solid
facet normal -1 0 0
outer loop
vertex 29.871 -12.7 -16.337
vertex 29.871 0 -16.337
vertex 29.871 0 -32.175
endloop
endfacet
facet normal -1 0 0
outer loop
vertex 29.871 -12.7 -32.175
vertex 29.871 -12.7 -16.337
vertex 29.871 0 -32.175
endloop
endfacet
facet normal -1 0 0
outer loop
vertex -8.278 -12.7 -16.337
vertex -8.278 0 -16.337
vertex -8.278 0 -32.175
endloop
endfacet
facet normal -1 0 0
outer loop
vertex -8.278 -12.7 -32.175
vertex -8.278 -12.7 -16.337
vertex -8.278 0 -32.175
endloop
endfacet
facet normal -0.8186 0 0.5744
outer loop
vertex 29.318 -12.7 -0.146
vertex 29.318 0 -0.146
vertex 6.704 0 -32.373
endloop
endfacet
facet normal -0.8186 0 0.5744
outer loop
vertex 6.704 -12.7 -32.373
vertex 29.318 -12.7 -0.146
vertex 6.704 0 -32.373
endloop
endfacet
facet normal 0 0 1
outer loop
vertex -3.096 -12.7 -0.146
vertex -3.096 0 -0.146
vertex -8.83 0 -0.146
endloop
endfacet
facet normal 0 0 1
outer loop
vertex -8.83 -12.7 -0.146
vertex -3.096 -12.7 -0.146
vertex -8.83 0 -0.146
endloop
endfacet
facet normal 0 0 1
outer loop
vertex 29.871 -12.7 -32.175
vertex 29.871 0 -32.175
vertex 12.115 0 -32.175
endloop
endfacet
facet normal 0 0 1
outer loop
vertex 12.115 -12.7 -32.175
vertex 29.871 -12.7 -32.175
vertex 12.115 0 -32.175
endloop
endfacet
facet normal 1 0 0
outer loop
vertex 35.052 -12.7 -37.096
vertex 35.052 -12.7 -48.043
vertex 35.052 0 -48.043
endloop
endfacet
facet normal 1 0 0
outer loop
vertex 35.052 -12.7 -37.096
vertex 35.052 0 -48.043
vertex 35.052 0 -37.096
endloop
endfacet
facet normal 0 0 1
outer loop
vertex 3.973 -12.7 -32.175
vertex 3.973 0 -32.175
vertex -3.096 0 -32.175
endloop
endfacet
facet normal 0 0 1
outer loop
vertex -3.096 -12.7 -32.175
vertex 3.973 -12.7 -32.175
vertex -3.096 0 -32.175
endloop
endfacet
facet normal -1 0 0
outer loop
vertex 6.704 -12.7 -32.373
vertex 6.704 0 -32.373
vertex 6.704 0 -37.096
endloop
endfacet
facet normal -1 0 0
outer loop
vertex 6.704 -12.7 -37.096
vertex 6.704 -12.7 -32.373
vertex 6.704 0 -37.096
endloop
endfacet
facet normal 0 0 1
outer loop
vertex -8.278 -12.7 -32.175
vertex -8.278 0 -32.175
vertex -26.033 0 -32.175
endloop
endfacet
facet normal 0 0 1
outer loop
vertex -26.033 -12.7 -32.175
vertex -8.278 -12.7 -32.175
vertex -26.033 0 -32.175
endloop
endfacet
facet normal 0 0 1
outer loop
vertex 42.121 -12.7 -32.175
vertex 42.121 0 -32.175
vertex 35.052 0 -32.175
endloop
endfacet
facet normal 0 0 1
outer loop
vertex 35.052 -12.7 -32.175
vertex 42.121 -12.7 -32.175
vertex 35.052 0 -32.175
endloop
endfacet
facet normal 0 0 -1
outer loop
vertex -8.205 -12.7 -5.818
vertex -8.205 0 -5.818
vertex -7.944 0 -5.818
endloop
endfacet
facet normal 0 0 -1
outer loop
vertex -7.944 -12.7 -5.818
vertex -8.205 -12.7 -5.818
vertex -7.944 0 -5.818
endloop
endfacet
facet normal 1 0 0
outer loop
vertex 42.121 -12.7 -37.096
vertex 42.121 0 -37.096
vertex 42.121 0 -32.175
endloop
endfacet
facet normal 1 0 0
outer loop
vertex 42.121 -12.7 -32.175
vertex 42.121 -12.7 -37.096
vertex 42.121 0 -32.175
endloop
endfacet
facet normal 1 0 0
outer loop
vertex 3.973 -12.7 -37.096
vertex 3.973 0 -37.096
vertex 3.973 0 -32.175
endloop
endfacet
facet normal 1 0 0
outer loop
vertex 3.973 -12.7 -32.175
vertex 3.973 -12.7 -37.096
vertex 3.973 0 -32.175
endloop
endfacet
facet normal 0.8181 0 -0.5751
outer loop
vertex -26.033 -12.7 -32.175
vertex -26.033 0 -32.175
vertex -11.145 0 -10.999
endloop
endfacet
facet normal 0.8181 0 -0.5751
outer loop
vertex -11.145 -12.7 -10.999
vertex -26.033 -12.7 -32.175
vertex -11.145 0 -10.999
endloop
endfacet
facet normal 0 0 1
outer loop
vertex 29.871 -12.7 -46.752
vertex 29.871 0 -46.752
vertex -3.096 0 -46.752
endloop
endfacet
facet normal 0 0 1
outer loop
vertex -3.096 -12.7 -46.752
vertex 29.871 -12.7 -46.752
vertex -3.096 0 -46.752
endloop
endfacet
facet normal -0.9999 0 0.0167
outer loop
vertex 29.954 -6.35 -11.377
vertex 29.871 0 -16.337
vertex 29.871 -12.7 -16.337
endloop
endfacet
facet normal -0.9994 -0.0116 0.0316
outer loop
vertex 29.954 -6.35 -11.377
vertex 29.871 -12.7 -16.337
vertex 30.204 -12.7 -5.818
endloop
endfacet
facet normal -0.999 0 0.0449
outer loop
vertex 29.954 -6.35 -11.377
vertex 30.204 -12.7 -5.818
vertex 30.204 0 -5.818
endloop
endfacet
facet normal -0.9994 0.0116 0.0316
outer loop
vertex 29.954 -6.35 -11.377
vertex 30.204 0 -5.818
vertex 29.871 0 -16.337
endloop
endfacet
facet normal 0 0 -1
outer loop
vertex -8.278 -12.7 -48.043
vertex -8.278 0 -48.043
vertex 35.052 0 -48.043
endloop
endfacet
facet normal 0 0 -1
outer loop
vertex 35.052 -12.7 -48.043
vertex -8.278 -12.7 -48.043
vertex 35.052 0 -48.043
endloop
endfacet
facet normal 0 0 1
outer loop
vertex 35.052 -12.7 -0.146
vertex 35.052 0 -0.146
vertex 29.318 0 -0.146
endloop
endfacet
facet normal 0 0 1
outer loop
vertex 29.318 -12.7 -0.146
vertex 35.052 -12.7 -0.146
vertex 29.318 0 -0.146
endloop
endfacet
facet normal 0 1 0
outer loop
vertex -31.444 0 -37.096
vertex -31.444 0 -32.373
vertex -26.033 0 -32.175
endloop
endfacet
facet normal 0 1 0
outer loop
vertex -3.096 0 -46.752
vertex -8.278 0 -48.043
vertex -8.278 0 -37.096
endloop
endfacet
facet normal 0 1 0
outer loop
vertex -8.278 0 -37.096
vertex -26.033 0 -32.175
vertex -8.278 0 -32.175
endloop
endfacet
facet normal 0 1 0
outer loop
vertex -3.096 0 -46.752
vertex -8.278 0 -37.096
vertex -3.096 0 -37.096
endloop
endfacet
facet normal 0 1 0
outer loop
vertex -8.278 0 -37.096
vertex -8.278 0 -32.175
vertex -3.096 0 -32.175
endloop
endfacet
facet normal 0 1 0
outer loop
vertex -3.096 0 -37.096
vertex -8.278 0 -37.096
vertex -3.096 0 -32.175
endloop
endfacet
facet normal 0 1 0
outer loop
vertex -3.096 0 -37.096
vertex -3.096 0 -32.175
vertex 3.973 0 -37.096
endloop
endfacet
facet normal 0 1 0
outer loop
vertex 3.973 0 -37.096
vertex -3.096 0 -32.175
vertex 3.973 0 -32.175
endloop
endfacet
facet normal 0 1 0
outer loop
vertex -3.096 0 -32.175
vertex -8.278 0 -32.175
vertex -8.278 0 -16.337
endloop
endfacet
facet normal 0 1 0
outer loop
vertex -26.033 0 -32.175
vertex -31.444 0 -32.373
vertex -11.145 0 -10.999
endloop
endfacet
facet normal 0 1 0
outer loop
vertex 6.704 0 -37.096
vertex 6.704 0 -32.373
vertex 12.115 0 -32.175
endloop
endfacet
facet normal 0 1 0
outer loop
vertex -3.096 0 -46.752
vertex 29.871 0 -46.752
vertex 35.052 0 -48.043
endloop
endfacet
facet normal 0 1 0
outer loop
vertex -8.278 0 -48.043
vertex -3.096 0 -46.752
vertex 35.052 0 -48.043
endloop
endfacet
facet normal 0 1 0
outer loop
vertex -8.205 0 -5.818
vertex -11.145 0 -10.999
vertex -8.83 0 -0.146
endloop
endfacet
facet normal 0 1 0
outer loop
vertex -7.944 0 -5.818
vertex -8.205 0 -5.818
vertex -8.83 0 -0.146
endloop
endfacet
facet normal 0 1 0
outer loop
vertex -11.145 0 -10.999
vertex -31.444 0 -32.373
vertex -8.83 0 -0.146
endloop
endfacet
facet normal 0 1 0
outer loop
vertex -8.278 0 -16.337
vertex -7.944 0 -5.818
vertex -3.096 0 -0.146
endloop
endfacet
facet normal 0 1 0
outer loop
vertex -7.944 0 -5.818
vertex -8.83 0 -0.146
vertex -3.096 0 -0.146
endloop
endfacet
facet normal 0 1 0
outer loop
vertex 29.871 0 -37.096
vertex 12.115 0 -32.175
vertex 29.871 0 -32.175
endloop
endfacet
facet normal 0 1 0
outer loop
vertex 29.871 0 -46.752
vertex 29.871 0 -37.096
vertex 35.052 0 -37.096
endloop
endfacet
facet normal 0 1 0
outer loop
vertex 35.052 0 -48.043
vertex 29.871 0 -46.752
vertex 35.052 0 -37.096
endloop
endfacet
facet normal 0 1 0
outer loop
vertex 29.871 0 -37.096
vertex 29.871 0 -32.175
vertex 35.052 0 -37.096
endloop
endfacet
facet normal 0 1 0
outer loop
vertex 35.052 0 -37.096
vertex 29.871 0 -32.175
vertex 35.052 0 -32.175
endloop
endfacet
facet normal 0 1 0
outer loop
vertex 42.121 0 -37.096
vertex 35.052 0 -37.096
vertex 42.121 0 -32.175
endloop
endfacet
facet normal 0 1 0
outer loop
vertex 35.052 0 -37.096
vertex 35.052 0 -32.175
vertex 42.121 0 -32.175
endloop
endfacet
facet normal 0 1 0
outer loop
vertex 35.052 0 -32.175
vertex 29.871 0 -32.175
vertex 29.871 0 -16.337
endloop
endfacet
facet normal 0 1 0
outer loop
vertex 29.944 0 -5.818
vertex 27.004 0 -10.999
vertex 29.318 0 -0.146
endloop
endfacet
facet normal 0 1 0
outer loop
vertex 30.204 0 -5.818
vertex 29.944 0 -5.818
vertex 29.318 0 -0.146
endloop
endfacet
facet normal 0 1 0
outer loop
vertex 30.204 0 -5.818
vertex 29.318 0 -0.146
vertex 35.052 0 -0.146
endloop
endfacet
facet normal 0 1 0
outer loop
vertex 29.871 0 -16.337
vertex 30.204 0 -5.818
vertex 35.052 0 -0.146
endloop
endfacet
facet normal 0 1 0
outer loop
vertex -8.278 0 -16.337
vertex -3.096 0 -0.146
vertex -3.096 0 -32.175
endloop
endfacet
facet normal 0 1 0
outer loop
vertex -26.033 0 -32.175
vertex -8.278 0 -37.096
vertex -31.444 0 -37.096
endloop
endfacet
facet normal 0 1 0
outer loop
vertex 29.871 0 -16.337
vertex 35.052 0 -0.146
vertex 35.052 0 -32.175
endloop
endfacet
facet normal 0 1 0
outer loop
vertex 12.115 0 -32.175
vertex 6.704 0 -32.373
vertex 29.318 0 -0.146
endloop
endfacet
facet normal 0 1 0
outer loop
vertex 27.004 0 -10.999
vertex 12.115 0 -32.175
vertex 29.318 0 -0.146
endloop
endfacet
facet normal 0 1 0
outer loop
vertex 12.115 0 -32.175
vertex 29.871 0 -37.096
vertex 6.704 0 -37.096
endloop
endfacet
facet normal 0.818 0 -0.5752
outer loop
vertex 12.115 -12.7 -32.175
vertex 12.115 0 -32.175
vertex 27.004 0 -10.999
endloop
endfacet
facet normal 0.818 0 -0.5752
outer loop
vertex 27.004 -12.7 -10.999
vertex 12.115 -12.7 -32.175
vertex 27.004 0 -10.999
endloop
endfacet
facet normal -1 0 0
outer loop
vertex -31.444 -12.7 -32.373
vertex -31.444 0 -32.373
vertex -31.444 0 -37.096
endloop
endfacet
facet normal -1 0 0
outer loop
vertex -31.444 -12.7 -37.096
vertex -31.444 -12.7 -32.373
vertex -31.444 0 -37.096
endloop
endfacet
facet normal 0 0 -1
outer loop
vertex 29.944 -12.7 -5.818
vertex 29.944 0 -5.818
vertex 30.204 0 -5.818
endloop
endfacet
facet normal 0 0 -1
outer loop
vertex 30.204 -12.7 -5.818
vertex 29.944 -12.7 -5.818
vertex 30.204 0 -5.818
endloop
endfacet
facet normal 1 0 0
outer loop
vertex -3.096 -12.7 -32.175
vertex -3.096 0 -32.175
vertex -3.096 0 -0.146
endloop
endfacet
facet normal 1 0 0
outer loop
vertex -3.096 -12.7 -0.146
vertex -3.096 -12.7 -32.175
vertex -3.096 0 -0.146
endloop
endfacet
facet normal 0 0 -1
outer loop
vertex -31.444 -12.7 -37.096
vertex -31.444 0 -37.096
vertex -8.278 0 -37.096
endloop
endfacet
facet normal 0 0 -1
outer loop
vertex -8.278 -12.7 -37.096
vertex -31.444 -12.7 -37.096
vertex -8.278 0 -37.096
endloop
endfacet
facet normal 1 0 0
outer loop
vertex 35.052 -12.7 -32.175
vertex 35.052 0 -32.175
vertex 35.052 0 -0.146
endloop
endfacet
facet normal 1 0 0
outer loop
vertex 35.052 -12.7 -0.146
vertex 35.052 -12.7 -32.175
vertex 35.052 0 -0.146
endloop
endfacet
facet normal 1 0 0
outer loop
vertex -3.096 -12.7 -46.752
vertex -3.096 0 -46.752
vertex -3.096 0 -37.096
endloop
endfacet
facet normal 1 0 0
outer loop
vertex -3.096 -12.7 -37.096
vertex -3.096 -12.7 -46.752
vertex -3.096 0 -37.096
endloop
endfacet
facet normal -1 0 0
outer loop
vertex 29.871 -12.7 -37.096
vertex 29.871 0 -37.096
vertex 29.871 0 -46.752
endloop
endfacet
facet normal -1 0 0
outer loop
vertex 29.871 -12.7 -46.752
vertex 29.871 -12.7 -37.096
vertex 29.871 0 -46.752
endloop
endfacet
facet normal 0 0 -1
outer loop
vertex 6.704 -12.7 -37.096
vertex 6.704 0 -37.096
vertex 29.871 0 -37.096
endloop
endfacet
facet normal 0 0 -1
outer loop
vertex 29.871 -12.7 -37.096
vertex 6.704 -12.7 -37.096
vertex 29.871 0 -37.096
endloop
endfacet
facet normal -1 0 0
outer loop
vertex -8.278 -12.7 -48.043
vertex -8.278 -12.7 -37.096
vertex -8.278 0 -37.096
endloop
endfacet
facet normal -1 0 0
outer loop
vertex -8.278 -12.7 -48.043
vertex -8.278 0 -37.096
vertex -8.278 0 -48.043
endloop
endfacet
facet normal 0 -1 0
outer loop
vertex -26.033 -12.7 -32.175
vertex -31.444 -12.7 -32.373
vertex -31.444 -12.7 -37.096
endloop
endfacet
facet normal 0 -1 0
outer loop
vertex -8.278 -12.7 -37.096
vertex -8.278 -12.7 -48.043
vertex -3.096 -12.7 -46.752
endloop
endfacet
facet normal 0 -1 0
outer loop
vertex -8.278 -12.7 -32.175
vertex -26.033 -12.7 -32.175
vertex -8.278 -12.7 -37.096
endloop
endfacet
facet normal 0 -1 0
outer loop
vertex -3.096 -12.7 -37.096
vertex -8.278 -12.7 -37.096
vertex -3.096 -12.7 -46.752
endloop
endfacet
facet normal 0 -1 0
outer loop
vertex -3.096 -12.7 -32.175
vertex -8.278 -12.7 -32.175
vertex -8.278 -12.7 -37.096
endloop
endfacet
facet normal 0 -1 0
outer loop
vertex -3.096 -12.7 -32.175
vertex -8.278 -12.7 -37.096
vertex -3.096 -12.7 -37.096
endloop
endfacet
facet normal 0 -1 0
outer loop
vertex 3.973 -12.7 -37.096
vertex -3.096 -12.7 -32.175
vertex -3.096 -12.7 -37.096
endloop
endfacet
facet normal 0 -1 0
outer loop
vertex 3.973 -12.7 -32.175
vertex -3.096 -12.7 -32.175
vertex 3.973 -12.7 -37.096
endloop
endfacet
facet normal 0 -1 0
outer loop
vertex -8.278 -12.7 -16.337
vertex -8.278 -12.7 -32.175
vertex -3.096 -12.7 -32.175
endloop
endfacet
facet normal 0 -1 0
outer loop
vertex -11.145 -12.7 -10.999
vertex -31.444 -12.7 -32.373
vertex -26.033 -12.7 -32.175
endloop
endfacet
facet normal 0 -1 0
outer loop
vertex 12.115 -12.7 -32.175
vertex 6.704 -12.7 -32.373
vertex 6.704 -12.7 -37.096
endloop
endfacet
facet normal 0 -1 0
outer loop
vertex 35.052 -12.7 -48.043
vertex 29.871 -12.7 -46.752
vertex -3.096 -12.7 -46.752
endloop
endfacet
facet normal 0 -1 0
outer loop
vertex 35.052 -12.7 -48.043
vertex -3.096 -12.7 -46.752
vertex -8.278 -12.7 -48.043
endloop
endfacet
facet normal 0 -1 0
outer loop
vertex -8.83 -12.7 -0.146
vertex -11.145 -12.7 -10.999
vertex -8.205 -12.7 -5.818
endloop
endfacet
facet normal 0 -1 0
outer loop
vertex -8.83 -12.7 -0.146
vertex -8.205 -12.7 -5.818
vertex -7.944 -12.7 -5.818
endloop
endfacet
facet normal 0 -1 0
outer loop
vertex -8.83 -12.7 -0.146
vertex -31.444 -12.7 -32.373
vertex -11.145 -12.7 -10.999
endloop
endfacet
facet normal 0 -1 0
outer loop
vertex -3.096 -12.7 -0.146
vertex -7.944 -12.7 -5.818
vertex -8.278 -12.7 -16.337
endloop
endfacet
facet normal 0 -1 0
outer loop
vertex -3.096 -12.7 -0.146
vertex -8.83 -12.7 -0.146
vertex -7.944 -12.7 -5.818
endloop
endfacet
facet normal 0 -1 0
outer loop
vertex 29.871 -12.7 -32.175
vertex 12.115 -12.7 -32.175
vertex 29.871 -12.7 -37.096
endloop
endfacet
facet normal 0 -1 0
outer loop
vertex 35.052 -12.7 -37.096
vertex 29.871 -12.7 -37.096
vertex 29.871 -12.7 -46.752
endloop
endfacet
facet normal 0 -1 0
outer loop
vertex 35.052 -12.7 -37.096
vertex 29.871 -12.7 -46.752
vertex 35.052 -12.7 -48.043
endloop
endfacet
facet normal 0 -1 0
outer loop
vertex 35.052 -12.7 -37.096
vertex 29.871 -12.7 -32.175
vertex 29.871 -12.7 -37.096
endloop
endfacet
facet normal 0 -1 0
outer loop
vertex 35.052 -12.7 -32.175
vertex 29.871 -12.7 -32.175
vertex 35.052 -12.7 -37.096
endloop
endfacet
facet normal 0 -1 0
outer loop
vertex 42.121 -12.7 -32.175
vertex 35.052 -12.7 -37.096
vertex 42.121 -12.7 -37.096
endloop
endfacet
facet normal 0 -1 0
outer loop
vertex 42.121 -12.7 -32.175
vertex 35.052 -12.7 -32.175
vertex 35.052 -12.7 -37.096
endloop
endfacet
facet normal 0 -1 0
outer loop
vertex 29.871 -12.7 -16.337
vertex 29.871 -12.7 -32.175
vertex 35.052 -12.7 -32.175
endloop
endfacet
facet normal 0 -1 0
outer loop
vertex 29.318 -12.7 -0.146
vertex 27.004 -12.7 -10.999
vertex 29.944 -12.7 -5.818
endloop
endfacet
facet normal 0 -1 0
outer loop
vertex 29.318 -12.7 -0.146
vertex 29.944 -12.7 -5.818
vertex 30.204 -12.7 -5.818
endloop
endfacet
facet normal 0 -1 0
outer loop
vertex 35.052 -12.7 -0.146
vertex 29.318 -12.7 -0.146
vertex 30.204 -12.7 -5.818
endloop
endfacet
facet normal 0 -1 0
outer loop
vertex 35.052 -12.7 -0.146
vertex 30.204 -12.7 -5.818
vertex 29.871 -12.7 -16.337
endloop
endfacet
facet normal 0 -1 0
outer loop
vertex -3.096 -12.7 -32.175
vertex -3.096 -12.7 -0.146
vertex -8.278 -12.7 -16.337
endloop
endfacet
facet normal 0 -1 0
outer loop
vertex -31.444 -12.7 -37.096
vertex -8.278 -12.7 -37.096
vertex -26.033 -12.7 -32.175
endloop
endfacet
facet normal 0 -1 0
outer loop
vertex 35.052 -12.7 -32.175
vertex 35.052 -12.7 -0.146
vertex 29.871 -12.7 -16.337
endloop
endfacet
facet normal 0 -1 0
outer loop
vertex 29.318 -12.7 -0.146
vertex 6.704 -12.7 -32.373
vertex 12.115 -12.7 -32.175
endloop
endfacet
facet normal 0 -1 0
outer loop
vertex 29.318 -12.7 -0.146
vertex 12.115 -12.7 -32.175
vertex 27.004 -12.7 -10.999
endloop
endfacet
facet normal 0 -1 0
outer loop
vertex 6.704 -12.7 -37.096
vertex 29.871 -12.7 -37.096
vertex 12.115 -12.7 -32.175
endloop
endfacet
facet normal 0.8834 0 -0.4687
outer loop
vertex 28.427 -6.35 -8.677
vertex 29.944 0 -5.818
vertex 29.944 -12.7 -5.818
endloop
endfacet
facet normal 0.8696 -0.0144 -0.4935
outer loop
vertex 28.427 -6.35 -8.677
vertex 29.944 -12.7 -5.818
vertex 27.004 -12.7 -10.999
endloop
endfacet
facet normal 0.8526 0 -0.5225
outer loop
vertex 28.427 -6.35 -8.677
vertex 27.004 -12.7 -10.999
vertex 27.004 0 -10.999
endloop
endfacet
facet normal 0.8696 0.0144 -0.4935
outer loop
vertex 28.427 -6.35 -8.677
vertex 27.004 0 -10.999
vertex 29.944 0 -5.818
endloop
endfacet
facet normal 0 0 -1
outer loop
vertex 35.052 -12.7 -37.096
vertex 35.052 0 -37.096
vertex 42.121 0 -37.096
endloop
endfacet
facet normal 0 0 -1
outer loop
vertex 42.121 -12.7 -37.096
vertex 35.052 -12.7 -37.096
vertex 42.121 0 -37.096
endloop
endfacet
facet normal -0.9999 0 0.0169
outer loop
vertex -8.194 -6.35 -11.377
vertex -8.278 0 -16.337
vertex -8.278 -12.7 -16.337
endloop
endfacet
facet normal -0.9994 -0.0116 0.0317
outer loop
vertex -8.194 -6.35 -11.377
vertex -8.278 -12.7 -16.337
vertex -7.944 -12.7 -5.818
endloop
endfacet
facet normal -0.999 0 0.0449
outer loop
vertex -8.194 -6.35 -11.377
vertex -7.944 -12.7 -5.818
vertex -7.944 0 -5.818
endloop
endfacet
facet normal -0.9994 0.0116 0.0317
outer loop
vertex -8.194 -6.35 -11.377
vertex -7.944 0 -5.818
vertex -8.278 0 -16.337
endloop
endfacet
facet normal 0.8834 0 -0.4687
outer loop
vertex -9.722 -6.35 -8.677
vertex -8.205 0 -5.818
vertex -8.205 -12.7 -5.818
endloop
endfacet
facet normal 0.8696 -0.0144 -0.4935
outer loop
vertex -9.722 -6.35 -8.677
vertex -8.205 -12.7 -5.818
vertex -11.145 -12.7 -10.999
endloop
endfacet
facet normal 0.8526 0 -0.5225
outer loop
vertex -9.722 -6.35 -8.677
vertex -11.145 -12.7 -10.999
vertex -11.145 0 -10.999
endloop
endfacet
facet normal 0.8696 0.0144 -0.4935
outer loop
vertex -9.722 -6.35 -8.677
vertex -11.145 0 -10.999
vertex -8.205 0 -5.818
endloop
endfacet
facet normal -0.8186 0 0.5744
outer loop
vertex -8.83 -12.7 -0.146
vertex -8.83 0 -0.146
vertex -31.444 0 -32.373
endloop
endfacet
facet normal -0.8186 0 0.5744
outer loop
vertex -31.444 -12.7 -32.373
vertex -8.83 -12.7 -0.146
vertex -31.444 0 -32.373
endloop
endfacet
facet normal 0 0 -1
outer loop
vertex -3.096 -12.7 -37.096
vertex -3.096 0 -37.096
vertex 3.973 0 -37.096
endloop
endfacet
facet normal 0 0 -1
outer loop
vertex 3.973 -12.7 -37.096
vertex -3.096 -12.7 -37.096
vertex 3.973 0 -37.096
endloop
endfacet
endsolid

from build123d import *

# Parameters (mm, degrees)
F0_W     = 0.0066861176
F0_H     = 1.2904889882
F0_W_2   = 32.9669154744
F0_W_3   = 0.0352981806
F1_DEPTH = 12.7


with BuildPart() as f1:
    # F0 (on Front) → F1 (new body)
    with BuildSketch(Plane.XZ):
        with Locations((-3.0995408706, -47.3976228386)):
            Rectangle(F0_W, F0_H)
        Polygon((-8.27790464, -48.0428673327), (-3.1028839294, -48.0428673327), (-3.1028839294, -46.7523783445), (-3.0961978118, -46.7523783445), (-3.0961978118, -37.0955993858), (3.972609491, -37.0955993858), (3.972609491, -32.1745417944), (-3.0961978118, -32.1745417944), (-3.0961978118, -0.1459635726), (-8.8304810221, -0.1459635726), (-31.4444088096, -32.3726352144), (-31.4444088096, -37.0955993858), (-8.27790464, -37.0955993858), align=None)
        with BuildLine():
            Line((-8.27790464, -16.3374941646), (-8.27790464, -32.1745417944))
            Line((-8.27790464, -32.1745417944), (-26.033330653, -32.1745417944))
            Line((-26.033330653, -32.1745417944), (-11.1450462452, -10.9993977943))
            add(Edge.make_bspline(
                [(-8.2049228537, -5.8176909661), (-9.7688182747, -8.945481808), (-11.1450462452, -10.9993977943)],
                knots=[0, 0, 0, 1, 1, 1], degree=2))
            Line((-8.2049228537, -5.8176909661), (-7.9442736169, -5.8176909661))
            add(Edge.make_bspline(
                [(-8.27790464, -16.3374941646), (-8.27790464, -11.67708581), (-7.9442736169, -5.8176909661)],
                knots=[0, 0, 0, 1, 1, 1], degree=2))
        make_face(mode=Mode.SUBTRACT)
        with Locations((13.3872599254, -47.3976228386)):
            Rectangle(F0_W_2, F0_H)
        with Locations((29.8883667529, -47.3976228386)):
            Rectangle(F0_W_3, F0_H)
        Polygon((29.9060158432, -46.7523783445), (29.9060158432, -48.0428673327), (35.0524244908, -48.0428673327), (35.0524244908, -37.0955993858), (42.1212317936, -37.0955993858), (42.1212317936, -32.1745417944), (35.0524244908, -32.1745417944), (35.0524244908, -0.1459635726), (29.3181412805, -0.1459635726), (6.704213493, -32.3726352144), (6.704213493, -37.0955993858), (29.8707176626, -37.0955993858), (29.8707176626, -46.7523783445), align=None)
        with BuildLine():
            Line((29.8707176626, -16.3374941646), (29.8707176626, -32.1745417944))
            Line((29.8707176626, -32.1745417944), (12.1152916496, -32.1745417944))
            Line((12.1152916496, -32.1745417944), (27.0035760574, -10.9993977943))
            add(Edge.make_bspline(
                [(29.9436994489, -5.8176909661), (28.3798040279, -8.945481808), (27.0035760574, -10.9993977943)],
                knots=[0, 0, 0, 1, 1, 1], degree=2))
            Line((29.9436994489, -5.8176909661), (30.2043486857, -5.8176909661))
            add(Edge.make_bspline(
                [(29.8707176626, -16.3374941646), (29.8707176626, -11.67708581), (30.2043486857, -5.8176909661)],
                knots=[0, 0, 0, 1, 1, 1], degree=2))
        make_face(mode=Mode.SUBTRACT)
    extrude(amount=F1_DEPTH)


solid = f1.part
